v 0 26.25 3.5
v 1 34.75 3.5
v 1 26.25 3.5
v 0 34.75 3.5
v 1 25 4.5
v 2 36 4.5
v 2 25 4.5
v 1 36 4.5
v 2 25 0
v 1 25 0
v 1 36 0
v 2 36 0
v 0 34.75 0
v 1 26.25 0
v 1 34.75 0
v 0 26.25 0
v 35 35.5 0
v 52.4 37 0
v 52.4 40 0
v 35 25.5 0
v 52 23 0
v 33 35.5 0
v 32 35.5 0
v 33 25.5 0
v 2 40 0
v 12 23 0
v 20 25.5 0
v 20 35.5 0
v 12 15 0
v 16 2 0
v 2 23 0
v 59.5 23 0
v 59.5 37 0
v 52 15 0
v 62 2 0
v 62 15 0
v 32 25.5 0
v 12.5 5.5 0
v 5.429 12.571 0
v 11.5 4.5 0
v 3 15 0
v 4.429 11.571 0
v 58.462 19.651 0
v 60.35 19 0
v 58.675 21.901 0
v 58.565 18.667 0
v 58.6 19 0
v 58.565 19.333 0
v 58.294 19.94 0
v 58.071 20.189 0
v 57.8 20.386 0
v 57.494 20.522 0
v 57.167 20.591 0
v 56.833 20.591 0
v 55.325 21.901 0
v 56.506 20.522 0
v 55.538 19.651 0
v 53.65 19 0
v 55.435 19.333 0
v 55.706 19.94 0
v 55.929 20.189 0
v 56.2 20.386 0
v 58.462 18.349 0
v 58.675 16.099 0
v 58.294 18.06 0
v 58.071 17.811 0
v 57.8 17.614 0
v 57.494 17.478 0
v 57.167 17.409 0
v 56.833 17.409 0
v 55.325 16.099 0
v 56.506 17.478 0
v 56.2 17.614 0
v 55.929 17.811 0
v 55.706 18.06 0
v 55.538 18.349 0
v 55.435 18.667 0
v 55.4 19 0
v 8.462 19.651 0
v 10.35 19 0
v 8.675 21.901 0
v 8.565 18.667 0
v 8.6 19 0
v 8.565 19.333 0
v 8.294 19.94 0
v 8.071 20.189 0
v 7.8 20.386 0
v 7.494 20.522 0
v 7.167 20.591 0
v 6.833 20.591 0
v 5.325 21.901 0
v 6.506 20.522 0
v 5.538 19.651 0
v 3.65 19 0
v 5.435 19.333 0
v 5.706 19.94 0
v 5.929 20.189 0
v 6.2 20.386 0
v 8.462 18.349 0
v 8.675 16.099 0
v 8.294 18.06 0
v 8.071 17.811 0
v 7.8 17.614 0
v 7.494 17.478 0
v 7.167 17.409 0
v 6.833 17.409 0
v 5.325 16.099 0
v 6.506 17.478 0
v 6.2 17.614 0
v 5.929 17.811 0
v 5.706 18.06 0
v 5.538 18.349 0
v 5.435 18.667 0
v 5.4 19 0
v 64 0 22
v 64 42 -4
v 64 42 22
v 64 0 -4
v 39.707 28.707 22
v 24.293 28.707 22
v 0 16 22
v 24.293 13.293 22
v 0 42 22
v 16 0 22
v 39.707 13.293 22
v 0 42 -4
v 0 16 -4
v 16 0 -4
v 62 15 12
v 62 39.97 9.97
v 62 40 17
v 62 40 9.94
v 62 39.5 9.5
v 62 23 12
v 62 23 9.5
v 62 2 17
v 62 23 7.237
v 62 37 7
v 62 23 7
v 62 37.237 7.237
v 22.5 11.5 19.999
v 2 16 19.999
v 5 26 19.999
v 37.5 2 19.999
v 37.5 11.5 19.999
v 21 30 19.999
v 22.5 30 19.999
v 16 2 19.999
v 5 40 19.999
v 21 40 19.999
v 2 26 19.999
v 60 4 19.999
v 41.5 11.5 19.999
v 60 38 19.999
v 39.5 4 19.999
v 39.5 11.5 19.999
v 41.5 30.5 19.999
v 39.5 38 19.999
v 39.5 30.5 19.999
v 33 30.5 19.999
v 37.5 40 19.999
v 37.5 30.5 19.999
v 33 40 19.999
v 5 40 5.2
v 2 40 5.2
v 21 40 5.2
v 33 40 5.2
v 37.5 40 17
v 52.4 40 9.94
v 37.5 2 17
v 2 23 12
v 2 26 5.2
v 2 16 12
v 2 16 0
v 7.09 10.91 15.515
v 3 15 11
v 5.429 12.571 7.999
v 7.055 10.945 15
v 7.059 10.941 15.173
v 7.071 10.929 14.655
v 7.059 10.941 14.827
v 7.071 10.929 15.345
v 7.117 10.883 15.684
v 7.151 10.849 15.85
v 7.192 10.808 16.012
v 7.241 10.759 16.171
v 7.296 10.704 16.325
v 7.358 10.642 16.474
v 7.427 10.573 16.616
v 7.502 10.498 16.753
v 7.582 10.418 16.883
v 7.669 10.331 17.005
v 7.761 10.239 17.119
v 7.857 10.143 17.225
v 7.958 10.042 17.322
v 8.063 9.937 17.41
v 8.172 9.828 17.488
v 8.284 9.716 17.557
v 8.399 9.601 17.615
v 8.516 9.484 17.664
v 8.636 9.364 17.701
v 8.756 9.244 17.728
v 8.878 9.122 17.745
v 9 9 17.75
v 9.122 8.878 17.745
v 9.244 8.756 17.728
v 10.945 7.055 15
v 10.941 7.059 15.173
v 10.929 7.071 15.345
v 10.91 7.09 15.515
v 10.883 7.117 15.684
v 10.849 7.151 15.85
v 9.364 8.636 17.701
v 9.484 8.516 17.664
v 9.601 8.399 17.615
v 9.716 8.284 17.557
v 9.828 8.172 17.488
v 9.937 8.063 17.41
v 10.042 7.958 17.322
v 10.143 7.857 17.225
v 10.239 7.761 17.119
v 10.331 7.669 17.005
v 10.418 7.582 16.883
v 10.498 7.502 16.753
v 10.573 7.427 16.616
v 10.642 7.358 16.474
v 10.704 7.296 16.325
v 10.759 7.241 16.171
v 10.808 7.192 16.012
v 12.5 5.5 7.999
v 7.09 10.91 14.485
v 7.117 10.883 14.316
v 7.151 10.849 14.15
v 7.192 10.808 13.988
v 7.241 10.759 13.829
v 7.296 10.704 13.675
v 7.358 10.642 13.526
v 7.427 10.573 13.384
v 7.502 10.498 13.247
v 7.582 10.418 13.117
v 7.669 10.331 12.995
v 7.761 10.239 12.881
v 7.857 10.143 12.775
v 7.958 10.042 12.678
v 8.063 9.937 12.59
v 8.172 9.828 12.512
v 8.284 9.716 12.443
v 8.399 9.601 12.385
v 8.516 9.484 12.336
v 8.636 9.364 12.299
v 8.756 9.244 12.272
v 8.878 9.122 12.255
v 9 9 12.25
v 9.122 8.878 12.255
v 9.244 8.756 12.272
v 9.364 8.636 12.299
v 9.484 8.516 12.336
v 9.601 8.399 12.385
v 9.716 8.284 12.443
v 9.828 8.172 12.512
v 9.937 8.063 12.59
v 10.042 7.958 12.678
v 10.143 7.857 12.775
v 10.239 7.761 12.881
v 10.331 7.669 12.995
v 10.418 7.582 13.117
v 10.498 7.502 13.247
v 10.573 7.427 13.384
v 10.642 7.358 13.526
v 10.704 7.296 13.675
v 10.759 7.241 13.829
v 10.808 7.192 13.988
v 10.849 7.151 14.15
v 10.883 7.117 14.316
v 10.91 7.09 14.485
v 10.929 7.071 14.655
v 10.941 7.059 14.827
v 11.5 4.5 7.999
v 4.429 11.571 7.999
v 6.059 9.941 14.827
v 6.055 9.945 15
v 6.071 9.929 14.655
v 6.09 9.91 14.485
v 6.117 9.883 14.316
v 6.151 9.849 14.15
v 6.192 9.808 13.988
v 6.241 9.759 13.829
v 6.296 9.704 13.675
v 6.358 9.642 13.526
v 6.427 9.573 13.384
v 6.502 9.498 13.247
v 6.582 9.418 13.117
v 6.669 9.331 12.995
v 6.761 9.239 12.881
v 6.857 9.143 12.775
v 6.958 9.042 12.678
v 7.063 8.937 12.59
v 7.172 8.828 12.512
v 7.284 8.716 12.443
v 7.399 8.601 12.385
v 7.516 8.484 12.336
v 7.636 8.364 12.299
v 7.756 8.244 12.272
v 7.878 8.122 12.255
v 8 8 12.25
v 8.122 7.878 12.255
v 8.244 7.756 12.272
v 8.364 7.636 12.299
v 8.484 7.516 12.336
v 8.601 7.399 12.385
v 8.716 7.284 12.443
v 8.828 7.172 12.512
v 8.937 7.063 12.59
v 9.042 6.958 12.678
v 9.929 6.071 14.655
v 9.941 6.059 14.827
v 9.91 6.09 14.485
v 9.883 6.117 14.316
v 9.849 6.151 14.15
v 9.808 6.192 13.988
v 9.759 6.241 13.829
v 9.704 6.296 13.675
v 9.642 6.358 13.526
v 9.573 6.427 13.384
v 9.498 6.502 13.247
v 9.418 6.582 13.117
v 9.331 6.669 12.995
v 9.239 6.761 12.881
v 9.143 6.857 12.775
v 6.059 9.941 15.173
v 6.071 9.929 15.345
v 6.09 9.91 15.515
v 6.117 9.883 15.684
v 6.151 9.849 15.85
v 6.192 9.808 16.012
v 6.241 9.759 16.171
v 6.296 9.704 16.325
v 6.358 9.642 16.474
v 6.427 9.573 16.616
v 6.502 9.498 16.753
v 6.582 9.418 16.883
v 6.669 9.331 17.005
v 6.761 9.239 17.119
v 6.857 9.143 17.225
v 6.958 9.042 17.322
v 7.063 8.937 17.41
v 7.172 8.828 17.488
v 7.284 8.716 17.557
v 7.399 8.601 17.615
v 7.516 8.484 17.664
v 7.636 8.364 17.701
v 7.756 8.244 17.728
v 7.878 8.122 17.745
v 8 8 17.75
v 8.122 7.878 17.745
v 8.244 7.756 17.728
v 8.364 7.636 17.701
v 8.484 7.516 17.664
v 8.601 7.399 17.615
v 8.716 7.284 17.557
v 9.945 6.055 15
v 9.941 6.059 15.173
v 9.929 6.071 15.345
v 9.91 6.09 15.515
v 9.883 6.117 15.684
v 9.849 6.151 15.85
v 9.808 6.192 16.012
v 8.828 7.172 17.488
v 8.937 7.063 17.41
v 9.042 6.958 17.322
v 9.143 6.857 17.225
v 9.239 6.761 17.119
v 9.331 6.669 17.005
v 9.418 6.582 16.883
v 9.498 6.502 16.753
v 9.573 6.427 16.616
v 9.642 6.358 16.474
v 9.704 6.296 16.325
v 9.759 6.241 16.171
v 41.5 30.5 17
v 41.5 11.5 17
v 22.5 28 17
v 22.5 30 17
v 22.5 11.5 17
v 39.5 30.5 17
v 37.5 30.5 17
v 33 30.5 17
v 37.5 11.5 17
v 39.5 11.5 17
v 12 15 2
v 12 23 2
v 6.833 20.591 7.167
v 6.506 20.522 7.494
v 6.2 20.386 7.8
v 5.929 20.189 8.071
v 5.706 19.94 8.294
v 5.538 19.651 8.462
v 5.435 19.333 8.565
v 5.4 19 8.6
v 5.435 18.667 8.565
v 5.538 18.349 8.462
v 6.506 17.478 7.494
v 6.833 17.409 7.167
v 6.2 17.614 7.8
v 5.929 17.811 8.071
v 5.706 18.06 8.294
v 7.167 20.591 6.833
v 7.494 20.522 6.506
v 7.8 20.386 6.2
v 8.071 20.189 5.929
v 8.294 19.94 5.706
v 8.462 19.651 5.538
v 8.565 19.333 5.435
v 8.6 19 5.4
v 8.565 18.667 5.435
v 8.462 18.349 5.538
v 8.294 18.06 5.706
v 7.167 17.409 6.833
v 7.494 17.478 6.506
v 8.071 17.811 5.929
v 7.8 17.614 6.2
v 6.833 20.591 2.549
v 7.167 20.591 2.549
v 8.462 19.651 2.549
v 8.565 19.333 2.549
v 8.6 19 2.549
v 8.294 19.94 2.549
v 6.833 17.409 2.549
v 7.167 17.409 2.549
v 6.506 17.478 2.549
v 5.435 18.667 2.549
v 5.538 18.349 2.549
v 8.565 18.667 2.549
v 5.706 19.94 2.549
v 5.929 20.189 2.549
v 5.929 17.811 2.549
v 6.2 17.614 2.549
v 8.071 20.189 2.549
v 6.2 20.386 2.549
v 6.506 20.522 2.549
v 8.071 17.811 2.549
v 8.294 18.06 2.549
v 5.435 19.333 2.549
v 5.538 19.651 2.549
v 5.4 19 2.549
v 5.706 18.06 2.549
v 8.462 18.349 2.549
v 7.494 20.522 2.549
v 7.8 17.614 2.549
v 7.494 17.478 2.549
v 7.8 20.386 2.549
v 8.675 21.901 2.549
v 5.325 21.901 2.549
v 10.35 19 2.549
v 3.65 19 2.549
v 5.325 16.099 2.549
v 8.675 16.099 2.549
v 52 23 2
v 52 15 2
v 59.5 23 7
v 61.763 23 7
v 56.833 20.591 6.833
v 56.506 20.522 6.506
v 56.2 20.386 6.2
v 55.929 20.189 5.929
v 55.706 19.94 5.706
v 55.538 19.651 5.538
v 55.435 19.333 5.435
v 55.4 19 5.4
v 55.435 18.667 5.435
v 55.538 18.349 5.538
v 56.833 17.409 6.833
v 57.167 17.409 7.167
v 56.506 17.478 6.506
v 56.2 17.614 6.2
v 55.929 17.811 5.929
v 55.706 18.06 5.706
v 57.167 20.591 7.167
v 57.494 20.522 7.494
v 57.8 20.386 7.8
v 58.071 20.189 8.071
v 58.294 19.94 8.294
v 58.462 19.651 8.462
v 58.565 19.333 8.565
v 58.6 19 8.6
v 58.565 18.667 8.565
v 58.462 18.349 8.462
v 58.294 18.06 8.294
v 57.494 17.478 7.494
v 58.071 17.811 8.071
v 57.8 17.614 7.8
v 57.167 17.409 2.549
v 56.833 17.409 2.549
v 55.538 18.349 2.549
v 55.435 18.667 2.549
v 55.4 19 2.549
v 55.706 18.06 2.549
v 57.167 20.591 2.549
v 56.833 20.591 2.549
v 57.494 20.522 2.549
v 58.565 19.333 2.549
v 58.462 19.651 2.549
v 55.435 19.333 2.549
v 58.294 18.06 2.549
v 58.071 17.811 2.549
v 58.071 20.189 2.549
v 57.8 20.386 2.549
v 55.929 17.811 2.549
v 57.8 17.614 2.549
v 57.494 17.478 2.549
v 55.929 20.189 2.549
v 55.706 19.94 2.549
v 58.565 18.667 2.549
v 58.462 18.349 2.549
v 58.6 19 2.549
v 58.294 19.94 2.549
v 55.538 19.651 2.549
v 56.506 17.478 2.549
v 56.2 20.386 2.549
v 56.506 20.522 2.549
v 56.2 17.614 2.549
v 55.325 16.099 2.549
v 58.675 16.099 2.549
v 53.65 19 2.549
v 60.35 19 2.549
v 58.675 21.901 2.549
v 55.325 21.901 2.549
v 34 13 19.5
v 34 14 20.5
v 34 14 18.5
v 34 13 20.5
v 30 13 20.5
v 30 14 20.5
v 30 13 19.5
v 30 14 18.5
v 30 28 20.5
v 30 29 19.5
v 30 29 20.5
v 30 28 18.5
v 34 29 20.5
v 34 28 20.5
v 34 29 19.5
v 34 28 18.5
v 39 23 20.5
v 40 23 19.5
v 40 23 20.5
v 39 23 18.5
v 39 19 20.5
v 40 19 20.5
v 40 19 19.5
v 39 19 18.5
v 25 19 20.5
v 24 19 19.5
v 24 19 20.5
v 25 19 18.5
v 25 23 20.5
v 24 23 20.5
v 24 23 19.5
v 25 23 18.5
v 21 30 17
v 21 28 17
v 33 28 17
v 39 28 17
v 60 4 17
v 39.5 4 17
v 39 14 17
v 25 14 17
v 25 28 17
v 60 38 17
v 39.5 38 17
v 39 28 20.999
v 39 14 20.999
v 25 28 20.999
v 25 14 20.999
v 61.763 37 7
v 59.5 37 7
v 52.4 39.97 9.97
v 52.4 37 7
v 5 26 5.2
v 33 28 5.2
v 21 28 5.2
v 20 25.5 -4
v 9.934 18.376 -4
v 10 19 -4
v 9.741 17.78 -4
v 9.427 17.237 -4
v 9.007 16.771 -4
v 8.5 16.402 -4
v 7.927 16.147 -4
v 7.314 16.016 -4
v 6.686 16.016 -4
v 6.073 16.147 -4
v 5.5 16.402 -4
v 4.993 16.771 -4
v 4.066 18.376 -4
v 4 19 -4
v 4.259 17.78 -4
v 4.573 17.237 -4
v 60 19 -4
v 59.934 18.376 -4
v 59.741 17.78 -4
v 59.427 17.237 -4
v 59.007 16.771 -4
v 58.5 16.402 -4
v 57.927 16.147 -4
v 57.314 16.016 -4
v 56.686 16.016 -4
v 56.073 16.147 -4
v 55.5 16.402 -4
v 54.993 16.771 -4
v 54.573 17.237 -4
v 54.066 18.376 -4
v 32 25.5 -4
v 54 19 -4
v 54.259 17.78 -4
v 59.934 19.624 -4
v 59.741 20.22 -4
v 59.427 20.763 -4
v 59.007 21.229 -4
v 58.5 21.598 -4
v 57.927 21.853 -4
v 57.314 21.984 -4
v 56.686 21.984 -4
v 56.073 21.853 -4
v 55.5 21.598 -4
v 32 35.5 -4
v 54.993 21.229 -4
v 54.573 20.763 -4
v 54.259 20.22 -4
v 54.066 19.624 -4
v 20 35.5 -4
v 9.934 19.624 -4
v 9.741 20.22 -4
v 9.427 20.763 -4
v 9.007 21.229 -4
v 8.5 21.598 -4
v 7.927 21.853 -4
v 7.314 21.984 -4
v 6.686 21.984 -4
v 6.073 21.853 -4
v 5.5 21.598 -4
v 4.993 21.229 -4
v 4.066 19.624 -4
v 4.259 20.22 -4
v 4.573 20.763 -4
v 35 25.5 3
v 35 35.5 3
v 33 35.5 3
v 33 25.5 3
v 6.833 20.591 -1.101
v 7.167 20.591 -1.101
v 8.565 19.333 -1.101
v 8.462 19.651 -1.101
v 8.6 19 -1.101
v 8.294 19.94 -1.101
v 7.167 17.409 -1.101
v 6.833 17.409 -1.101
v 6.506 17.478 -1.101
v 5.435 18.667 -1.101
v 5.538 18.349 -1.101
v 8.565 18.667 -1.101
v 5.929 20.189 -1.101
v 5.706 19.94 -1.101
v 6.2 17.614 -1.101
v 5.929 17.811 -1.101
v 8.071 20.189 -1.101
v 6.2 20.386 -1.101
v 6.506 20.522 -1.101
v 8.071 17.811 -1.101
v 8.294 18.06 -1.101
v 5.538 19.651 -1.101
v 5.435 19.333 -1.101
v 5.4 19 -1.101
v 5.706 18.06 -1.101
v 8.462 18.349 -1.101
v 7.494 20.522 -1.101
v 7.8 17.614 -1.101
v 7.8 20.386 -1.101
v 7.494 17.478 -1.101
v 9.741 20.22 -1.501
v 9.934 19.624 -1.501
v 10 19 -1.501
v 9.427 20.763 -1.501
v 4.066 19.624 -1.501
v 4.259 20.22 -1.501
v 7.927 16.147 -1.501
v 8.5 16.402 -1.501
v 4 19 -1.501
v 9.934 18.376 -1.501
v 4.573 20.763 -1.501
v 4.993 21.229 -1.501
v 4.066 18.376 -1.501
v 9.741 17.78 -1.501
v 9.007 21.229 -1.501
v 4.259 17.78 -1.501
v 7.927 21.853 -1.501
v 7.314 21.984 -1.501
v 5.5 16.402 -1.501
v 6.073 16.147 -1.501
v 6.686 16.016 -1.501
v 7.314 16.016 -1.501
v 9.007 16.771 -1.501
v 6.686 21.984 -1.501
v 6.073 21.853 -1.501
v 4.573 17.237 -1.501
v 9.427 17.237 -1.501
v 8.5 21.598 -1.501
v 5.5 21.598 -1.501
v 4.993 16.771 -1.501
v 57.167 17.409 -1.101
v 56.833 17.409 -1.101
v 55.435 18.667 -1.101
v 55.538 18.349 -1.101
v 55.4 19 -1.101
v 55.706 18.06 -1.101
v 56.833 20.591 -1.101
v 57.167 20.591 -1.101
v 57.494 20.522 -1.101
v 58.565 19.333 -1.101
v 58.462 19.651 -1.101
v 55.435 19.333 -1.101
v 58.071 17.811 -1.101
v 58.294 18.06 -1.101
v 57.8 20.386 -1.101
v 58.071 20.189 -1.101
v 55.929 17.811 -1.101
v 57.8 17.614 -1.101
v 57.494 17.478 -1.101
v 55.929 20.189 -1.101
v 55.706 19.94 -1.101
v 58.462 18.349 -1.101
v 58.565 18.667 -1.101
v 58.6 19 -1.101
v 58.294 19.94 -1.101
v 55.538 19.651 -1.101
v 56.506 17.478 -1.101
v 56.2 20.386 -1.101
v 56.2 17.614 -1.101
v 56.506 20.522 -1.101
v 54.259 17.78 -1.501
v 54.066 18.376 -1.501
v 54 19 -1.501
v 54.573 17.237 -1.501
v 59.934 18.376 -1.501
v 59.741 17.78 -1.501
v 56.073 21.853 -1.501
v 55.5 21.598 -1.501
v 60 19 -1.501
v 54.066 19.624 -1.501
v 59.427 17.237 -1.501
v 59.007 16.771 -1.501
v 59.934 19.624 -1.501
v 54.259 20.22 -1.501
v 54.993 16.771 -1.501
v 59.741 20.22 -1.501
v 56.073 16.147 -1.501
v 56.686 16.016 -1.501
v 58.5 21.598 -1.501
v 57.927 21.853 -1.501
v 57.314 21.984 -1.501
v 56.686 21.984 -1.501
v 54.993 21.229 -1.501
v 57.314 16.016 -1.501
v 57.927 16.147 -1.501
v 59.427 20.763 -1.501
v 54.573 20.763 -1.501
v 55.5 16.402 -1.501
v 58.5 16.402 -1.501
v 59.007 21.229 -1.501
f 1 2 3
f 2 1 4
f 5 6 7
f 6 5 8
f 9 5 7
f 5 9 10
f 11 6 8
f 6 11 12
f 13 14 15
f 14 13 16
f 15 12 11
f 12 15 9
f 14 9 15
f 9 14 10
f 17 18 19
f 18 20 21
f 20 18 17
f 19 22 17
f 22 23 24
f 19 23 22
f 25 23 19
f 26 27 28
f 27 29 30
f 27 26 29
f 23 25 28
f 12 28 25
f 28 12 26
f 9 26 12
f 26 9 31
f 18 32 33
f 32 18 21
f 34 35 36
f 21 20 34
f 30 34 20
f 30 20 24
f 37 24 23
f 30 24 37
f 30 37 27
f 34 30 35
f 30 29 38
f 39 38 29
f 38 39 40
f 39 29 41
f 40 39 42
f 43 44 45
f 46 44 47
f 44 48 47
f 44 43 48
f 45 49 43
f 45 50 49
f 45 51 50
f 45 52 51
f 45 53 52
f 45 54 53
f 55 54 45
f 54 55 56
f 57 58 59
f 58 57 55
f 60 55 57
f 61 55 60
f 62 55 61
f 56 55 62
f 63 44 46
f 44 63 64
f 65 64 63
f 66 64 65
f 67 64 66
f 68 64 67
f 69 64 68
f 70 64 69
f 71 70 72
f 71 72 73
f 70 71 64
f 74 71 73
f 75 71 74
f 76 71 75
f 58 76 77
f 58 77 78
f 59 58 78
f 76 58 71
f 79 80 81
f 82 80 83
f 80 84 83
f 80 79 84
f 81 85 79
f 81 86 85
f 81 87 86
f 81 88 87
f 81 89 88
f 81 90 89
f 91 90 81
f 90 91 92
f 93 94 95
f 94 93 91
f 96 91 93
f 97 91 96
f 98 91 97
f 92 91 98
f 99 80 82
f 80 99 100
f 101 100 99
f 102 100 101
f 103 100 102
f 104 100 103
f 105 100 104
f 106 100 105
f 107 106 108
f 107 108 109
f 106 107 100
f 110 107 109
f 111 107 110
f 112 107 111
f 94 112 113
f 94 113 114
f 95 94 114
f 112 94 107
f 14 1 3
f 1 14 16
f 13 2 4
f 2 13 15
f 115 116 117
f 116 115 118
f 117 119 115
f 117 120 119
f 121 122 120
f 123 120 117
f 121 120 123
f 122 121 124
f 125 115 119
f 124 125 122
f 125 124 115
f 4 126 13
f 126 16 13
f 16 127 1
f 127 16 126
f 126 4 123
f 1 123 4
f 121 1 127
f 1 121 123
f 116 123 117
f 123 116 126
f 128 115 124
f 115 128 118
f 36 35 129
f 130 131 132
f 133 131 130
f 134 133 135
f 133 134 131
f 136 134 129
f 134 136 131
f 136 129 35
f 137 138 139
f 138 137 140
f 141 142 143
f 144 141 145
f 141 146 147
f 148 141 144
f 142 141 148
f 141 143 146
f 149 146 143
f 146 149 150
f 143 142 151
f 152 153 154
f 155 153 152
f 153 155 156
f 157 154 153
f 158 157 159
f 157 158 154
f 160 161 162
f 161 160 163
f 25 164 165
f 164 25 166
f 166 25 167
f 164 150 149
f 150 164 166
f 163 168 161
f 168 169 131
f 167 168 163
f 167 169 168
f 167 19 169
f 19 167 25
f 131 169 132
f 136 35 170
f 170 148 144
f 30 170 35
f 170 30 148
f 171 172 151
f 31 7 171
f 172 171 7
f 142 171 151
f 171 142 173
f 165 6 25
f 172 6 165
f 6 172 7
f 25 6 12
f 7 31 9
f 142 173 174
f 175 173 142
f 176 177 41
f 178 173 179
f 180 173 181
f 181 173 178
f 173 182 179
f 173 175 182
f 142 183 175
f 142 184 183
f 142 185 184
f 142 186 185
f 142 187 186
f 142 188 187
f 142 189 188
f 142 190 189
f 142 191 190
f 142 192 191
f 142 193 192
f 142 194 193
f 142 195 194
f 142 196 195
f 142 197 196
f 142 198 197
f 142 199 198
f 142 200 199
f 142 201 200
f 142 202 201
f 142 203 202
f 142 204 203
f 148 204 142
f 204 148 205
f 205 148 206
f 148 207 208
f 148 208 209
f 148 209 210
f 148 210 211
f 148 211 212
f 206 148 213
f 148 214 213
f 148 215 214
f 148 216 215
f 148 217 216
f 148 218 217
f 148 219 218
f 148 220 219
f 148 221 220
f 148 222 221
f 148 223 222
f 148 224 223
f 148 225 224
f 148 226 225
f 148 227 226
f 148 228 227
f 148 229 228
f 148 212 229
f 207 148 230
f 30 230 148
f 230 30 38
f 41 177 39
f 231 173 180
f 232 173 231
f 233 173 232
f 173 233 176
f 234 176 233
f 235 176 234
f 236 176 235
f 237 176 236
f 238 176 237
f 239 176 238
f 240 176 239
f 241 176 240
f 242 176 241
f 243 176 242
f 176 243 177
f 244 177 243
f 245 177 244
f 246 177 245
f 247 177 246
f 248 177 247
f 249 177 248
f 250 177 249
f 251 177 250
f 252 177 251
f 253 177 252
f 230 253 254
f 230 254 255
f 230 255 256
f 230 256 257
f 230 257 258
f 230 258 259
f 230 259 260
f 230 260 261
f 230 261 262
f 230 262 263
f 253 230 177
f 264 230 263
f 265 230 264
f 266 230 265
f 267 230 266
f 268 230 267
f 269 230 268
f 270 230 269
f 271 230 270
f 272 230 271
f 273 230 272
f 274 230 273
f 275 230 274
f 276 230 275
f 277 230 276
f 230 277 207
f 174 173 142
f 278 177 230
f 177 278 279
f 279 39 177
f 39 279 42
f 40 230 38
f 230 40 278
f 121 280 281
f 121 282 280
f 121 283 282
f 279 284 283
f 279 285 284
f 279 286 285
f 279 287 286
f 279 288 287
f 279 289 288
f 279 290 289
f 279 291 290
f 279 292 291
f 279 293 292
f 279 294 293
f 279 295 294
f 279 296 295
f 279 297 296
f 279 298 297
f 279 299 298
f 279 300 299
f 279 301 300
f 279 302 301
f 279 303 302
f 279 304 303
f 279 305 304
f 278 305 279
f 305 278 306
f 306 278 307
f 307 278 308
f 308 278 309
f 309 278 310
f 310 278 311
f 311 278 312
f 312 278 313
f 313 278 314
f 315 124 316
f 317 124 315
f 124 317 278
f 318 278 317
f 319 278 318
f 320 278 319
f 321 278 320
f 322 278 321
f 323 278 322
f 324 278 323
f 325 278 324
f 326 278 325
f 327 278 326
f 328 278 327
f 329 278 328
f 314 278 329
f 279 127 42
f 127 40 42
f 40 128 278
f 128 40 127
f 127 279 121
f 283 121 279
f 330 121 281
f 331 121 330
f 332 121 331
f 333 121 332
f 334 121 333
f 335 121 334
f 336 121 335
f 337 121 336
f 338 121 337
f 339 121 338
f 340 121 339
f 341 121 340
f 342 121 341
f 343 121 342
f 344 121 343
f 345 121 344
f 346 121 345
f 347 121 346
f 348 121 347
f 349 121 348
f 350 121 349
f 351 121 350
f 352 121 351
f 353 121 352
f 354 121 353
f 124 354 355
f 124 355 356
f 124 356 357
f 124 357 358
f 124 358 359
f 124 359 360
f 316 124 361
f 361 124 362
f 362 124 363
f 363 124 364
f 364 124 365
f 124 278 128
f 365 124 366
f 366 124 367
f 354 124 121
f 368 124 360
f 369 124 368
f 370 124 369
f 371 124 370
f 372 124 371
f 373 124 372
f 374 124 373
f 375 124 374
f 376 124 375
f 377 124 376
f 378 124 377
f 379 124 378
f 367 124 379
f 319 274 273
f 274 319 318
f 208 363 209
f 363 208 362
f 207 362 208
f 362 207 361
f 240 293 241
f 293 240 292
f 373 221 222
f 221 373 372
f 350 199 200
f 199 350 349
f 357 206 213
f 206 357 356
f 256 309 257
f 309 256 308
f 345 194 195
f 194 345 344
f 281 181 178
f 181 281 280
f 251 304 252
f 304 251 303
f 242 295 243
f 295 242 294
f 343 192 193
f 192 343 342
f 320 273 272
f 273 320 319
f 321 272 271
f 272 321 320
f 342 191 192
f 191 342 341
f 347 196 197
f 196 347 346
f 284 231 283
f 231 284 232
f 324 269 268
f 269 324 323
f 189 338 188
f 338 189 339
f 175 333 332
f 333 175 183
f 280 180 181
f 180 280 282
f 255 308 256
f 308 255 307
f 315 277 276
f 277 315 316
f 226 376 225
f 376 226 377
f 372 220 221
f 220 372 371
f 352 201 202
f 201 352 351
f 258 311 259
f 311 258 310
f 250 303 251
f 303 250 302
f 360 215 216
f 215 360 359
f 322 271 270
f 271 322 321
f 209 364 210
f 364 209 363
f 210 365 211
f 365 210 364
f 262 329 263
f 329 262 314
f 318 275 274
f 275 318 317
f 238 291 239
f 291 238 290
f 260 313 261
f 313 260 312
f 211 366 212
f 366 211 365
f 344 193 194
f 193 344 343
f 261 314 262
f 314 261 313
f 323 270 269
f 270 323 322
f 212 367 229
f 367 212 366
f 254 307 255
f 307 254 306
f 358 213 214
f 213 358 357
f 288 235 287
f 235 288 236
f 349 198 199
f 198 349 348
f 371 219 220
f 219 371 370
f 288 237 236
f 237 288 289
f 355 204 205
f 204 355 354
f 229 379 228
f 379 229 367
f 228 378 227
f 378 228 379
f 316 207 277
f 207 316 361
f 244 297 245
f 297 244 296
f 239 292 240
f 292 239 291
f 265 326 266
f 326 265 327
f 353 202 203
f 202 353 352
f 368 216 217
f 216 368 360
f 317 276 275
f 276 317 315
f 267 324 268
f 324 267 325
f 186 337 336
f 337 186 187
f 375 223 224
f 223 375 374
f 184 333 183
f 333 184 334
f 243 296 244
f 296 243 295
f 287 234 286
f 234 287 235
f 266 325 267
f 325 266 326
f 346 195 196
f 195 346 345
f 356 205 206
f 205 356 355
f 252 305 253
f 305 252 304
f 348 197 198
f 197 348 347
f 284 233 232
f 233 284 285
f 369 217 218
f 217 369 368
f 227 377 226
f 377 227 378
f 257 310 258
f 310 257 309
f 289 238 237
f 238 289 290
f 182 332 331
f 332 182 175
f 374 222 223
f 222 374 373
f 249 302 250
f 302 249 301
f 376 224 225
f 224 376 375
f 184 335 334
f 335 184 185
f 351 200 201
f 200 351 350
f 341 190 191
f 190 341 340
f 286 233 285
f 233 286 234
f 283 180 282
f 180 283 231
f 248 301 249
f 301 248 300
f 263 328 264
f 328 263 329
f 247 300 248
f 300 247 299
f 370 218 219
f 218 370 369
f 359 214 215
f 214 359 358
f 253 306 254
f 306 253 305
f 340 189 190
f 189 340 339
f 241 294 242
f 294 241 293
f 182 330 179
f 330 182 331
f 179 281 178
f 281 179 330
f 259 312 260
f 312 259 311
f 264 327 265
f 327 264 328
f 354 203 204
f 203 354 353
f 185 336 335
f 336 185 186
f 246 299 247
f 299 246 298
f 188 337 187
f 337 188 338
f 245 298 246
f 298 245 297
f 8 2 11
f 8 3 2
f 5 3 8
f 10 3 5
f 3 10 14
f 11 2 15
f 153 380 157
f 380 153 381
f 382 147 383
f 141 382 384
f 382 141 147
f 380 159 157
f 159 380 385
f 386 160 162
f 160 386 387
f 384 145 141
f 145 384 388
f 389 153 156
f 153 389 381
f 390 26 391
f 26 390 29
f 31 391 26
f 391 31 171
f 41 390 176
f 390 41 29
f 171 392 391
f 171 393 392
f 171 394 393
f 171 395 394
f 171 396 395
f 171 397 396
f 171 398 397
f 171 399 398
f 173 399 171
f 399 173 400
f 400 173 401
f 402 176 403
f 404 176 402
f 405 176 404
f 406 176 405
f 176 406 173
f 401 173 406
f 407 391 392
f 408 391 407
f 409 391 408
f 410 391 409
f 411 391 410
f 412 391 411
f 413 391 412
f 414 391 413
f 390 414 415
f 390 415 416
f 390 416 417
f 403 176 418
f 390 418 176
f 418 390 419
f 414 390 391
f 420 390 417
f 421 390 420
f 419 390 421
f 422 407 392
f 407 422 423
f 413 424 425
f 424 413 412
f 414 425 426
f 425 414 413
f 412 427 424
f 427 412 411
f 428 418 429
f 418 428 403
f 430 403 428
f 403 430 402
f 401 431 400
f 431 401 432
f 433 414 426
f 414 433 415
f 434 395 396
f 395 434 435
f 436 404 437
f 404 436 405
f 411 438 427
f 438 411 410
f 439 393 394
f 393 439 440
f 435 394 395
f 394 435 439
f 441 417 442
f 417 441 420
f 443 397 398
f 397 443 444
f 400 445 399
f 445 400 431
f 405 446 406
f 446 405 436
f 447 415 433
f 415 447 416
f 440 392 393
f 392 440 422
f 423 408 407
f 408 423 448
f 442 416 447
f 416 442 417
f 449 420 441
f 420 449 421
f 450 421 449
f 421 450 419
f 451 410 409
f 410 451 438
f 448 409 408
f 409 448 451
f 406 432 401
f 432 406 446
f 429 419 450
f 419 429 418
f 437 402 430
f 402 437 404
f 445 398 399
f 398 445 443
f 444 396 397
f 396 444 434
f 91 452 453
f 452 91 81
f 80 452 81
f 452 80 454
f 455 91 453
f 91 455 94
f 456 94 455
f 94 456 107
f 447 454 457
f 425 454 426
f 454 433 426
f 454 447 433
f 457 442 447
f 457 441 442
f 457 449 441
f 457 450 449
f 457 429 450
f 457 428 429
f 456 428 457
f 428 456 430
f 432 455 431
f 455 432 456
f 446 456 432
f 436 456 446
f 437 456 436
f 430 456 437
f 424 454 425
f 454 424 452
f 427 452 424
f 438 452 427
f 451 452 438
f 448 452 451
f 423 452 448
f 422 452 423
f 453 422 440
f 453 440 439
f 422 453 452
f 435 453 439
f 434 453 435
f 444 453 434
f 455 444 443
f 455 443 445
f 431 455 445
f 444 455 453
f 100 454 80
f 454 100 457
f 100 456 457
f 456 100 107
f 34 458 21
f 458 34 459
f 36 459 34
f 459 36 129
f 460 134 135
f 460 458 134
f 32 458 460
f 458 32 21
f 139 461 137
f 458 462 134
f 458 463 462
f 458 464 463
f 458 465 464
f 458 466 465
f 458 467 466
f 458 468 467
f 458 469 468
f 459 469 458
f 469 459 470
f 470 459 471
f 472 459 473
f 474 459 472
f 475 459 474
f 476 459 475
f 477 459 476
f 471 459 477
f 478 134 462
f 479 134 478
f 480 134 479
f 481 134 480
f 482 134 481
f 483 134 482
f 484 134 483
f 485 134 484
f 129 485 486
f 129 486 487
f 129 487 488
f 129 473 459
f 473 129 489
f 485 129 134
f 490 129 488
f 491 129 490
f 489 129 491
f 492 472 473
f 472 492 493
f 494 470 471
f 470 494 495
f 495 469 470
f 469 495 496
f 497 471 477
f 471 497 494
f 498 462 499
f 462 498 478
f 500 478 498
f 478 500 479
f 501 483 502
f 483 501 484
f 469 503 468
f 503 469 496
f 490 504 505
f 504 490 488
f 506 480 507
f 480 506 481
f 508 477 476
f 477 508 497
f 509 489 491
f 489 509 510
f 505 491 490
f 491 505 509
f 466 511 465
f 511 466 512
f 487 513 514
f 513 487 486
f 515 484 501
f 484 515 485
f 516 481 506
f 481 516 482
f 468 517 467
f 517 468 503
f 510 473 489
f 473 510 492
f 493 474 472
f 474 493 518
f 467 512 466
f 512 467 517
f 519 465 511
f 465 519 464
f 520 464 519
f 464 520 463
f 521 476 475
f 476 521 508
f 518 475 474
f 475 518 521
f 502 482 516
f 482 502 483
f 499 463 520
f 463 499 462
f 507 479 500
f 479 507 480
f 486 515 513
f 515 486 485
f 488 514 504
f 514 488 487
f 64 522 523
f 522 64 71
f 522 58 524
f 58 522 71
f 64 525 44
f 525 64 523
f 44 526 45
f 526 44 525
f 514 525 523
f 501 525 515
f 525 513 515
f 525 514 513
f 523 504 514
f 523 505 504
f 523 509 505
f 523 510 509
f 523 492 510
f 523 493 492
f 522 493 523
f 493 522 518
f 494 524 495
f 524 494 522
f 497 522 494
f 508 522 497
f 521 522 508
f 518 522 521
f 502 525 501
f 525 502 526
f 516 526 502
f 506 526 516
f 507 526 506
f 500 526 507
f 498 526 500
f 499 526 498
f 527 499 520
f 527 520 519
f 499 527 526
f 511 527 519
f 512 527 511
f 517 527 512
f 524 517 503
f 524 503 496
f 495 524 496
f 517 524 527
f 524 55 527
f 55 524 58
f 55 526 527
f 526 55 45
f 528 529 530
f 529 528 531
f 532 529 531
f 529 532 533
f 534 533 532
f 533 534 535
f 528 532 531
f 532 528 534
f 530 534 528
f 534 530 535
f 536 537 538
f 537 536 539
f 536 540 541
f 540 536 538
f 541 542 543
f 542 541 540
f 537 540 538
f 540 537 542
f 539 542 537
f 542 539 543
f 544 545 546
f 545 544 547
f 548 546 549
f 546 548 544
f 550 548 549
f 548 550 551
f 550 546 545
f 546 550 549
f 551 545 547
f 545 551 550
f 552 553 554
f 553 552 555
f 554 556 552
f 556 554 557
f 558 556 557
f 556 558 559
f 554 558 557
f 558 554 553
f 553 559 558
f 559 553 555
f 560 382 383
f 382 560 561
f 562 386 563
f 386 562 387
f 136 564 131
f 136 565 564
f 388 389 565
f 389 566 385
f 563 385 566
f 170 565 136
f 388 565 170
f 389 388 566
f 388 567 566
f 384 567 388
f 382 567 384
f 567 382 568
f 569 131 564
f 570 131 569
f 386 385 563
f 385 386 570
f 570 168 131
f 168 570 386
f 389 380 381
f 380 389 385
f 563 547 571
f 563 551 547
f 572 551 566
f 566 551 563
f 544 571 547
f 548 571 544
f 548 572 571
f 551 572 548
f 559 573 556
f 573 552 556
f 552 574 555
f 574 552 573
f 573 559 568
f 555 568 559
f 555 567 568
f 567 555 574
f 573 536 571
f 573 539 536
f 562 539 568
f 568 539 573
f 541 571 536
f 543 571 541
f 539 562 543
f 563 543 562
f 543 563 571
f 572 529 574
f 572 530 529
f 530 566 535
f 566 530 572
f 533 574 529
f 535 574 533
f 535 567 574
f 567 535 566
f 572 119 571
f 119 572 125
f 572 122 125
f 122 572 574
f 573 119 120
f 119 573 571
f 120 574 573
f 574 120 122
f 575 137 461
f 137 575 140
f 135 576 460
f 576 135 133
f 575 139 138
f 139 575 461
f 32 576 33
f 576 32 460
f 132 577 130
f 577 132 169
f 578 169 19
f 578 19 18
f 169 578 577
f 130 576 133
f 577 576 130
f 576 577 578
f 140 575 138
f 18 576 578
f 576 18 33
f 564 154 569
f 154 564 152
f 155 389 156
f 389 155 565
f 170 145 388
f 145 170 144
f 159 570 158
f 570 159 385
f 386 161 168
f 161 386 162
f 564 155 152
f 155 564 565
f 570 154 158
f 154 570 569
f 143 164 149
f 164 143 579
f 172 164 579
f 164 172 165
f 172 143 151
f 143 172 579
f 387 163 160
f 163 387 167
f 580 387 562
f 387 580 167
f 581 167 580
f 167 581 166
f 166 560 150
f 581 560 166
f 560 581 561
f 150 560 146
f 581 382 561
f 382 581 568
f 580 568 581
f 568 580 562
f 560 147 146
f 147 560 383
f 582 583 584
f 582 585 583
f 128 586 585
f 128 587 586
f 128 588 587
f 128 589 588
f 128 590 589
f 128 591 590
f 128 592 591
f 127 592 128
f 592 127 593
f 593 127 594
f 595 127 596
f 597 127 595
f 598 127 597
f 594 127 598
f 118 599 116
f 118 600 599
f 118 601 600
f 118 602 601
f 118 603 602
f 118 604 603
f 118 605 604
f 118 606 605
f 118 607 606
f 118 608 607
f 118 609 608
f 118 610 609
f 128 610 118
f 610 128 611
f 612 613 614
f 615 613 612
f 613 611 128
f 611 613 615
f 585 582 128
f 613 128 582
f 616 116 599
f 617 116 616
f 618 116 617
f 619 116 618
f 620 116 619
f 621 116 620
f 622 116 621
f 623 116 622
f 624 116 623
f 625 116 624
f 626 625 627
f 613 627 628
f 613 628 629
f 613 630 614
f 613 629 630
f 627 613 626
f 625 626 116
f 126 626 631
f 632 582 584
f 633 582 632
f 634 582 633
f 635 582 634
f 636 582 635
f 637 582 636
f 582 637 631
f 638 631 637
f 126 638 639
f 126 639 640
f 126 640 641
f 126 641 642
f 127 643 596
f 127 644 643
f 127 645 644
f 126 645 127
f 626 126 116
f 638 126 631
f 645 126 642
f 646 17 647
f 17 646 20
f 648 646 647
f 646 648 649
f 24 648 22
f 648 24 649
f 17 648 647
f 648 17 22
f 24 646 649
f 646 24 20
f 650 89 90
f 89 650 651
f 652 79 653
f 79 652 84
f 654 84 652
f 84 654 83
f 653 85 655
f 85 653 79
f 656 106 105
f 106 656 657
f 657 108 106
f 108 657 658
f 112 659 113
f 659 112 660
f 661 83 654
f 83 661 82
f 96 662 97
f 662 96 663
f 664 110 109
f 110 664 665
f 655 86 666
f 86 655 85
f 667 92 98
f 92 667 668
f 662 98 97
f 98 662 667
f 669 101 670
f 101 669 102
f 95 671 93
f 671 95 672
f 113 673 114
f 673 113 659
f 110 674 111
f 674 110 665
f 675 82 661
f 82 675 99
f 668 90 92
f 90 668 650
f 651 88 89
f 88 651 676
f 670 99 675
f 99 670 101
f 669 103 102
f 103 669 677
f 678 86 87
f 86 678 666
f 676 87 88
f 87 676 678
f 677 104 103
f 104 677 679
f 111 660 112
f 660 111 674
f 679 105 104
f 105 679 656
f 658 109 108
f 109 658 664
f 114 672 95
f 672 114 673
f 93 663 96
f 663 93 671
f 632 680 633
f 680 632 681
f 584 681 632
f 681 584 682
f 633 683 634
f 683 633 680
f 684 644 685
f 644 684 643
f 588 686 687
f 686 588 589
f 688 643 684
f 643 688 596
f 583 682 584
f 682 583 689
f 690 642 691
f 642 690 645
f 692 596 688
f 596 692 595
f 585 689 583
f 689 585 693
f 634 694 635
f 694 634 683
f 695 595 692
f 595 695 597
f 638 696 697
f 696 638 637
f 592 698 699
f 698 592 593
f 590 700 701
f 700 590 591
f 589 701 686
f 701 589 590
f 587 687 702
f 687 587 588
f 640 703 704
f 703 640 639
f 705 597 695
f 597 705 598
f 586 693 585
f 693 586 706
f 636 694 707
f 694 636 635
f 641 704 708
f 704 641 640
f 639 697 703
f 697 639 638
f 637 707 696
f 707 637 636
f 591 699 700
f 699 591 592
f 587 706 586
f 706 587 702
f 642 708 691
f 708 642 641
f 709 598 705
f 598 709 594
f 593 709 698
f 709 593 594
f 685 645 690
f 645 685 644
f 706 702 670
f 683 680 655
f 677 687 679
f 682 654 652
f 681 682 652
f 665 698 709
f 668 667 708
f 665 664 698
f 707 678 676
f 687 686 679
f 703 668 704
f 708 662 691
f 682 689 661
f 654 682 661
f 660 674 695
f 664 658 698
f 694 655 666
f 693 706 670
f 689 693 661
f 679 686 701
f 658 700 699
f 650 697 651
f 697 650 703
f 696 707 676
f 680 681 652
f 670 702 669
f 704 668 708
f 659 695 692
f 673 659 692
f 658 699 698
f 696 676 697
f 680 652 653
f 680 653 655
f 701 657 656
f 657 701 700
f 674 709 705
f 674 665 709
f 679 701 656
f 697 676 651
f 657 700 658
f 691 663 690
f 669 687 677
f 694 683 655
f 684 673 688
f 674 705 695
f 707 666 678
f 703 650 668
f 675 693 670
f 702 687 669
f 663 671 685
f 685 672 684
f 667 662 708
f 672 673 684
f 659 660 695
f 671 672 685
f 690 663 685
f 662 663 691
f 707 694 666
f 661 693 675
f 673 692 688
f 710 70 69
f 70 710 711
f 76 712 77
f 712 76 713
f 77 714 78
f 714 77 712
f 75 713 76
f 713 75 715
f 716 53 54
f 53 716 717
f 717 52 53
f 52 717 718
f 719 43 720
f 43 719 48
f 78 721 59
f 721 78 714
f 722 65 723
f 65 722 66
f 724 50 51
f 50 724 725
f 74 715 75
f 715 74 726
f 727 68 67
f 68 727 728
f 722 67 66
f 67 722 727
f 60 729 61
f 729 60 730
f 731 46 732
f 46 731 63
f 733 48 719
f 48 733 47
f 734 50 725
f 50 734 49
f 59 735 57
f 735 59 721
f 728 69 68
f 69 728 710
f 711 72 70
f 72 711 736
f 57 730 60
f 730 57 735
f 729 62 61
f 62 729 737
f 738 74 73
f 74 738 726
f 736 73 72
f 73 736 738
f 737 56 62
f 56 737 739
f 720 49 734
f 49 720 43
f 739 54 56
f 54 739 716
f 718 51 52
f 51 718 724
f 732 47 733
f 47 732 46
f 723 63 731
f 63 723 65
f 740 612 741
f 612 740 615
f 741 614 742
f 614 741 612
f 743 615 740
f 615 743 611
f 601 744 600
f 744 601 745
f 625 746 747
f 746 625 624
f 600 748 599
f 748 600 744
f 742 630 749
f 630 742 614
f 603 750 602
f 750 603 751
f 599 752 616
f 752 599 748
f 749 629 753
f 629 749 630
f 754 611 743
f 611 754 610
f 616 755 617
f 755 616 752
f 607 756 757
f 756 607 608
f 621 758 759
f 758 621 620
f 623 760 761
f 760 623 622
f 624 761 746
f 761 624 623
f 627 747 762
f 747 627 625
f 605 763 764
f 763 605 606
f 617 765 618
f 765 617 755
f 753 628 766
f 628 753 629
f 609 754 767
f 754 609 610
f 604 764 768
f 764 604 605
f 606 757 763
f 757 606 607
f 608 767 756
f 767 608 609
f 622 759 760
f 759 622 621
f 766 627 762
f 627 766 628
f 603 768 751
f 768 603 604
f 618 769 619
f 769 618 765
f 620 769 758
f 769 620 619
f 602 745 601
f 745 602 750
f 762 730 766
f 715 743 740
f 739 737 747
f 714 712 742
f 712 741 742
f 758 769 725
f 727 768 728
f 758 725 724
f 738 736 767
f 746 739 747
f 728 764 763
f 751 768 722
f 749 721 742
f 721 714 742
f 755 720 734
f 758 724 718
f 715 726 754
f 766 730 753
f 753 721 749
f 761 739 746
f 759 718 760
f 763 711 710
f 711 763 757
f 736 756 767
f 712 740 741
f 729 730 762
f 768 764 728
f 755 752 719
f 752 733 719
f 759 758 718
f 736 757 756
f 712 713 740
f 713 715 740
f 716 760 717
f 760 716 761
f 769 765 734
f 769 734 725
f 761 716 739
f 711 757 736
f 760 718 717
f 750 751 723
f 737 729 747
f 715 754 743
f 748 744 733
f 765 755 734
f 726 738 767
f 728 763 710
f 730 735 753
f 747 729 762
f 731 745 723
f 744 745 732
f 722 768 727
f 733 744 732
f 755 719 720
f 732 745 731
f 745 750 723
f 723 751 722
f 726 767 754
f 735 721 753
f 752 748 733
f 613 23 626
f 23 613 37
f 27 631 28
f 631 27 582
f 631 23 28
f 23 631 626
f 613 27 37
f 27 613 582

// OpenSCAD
//
// ktBOX4
//
//


gap1 = 0.001;
gap2 = 0.002;

panel_thick = 2;
panel_thick2 = 2+2;

X = 60;
Y = 38;
Z = 20;


key_pitch_x = 19;
key_pitch_y = 19;
hole_x = 14;
hole_y = 14;
keybase_thick = 5;

A = 1;
B = 1;
C = 0; //not use

if(A)
{
difference()
{
    union()
    {
        translate([0, 0, 0]) cube([X+panel_thick*2, Y+panel_thick*2, Z+panel_thick]);
    }
    translate([panel_thick+14, panel_thick, -gap1]) cube([X-14, Y, Z]);
    translate([panel_thick, panel_thick+14, -gap1]) cube([14+gap1, Y-14, Z]);
    //kado
    translate([14+panel_thick, panel_thick, -gap1]) rotate([0, 0, 45]) cube([14, 14*sqrt(2), Z]);
    translate([8.5, 1.5, -gap1]) rotate([0, 0, 45]) cube([10, 10, 8]);
    translate([16, 0, -gap1]) rotate([0, 0, 90+45]) cube([50, 50, 50]);
    //SW hole
    translate([0, 0, Z-5]) rotate([90, 0, -45]) cylinder(30, d=4.5+1, center=true, $fn=100);
    //board
    #translate([-gap1, Y-2, 4.5]) rotate([180, 0, 0]) board();
    translate([1.5-0.5, Y-2, 4.5]) rotate([180, 0, 0]) cube([7.5, 10+1, 7.5]);
    //Key hole
    translate([(X+panel_thick*2)/2-key_pitch_x/2, (Y+panel_thick*2)/2-key_pitch_y/2, Z+panel_thick-keybase_thick+gap1]) cube([key_pitch_x, key_pitch_y, keybase_thick]);
}
//screw
translate([panel_thick, Y/2-8/2, 0]) Fscrew();
translate([X+panel_thick, Y/2+8/2, 0]) rotate([0, 0, 180]) Fscrew();
//Spacer1
translate([X-0.5, Y-16, 7]) rotate([0, 45, 0]) cube([1.6, 18, 4]);
translate([X-0.5, Y-16, 0]) cube([3, 18, 7]);
//Spacer2
translate([X+2.4, Y-1, 7]) rotate([0, 45, 90]) cube([2.5, 10, 4.2]);
translate([X+2.4, Y-1, 0]) rotate([0, 0, 90]) cube([4, 10, 7]);
//Key
translate([(X+panel_thick*2)/2-key_pitch_x/2, (Y+panel_thick*2)/2-key_pitch_y/2, Z+panel_thick]) key(0,0);
//base
translate([X+panel_thick-2, (Y+panel_thick*2)/2-Y/2, Z+panel_thick-keybase_thick]) cube([2, Y, keybase_thick]);
translate([(X-4+panel_thick*2)/2+key_pitch_x/2-2, panel_thick, Z+panel_thick-keybase_thick]) cube([2, 10, keybase_thick]);
translate([(X-4+panel_thick*2)/2+key_pitch_x/2-2, (Y+panel_thick*2)-12, Z+panel_thick-keybase_thick]) cube([2, 12, keybase_thick]);
translate([X-22, (Y+panel_thick*2)/2-Y/2, Z+panel_thick-keybase_thick]) cube([23, 2, keybase_thick]);
translate([X-22, Y, Z+panel_thick-keybase_thick]) cube([23, 2, keybase_thick]);
//tower
translate([panel_thick, (Y+panel_thick*2)-16, 5.2]) cube([3, 16, Z-5.2]);
translate([(X-3+panel_thick*2)/2-key_pitch_x/2, (Y+panel_thick*2)-14, 5.2]) cube([12, 14, Z-5.2-3]);
translate([(X-3+panel_thick*2)/2-key_pitch_x/2, (Y+panel_thick*2)-12, Z-3]) cube([12, 12, 3]);
}
if(B)
{
difference()
{
    union()
    {
        translate([0, 0, -panel_thick2]) cube([X+panel_thick*2, Y+panel_thick*2, panel_thick2]);
        translate([20+13, Y-2-10.5, 0]) cube([2, 10, 3]);
    }
    //window
    translate([20, Y-2-10.5, -panel_thick2-gap1]) cube([12, 10, panel_thick2+gap2]);
    //screw
    translate([panel_thick, Y/2-8/2, -panel_thick2]) Mscrew();
    translate([X+panel_thick, Y/2+8/2, -panel_thick2]) rotate([0, 0, 180]) Mscrew();
    //kado
    translate([16, 0, -10]) rotate([0, 0, 90+45]) cube([50, 50, 50]);
}
}
if(C)
{
difference()
{
    union()
    {
        translate([0, 0, 0]) cube([X+panel_thick*2, Y+panel_thick*2, Z+panel_thick]);
    }
    //kado
    translate([130, 25, -gap1]) rotate([0, 0, 90+45]) cube([150, 100, 50]);
    //SW hole
    difference()
    {
        translate([0, 0, Z-5]) rotate([90, 0, -45]) cylinder(20, d=5+0.5, center=true, $fn=100);
        translate([10, -5, -gap1]) rotate([0, 0, 90+45]) cube([20, 20, 50]);
    }
    //SW hole2
    difference()
    {
        translate([0, 0, Z-5]) rotate([90, 0, -45]) cylinder(20, d=8+1.5, center=true, $fn=100);
        translate([14, -5, -gap1]) rotate([0, 0, 90+45]) cube([20, 20, 50]);
    }
    //hole
    translate([0, 0, 2.5-gap1]) rotate([0, 0, 90+45]) cube([6, 30, 5], center=true);
}
difference()
{
    translate([12.3, 6, -gap1]) rotate([0, 0, 90+45]) cube([10-1, 6, 8-1]);
    translate([0, 0, 2.5-gap1]) rotate([0, 0, 90+45]) cube([6, 30, 5], center=true);
}
}





module key( x, y, w=1 ){
    translate( [key_pitch_x*x + key_pitch_x/2 + key_pitch_x*(w - 1)/2, key_pitch_y*y + key_pitch_y/2, -(keybase_thick/2)] ){
        difference(){
            cube( [key_pitch_x*w, key_pitch_y, keybase_thick], center=true );
            cube( [hole_x, hole_y, keybase_thick + gap2], center=true );
            translate( [0, -hole_y/2, keybase_thick/2 - 1.5] )
            claw();
            translate( [0, hole_y/2, keybase_thick/2 - 1.5] )
            rotate( [0, 0, 180] )
            claw();
            translate( [hole_x/2, 0, keybase_thick/2 - 1.5] )
            rotate( [0, 0, 90] )
            claw();
            translate( [-hole_x/2, 0, keybase_thick/2 - 1.5] )
            rotate( [0, 0, -90] )
            claw();
            translate( [0, 0, keybase_thick + 2] )
            rotate( [180, 0, 45] )
            cylinder( hole_y*1.1, hole_y*1.1, 0, $fn=4 );
        }
    }
}
module claw(){
    translate( [-2, -1, -1] ){
        difference(){
            union(){
                cube( [4, 2, 1] );
                rotate( [-45, 0, 0] )
                cube( [4, 2, 1] );
            }
            translate( [-gap1, 1+gap1, -2-gap1] )
            cube( [4+gap2, 2, 3+gap2] );
        }
    }
}

module board()
{
    difference()
    {
        union()
        {
            translate([1.5, 0, 0]) cube([57.5, 10+1, 1]);
            translate([0, (10+1)/2-(7.5+1)/2, 1]) cube([5.5, 7.5+1, 3.5]);
            translate([5.5, 0, 1]) cube([14.3, 10+1, 1]);
            translate([5.5, 0, -0.5]) cube([14.3, 10+1, 0.5]);
            translate([20, 0, 1]) cube([13, 10+1, 2.5]);
            translate([20, 0, -0.7]) cube([13, 10+1, 0.7]);
            translate([36, 0, 0]) cube([5, 10+1, 2]);
            translate([42.5, (10+1)/2-(13/2), 0]) cube([17.5, 13+1, 2]);
            translate([42.5, (10+1)/2-(13/2), -11]) cube([17.5, 13+1, 11]);
            
            translate([38, -3, -12]) cube([23.5, 36.2, 1]);
        }
    }
}

module Fscrew()
{
    difference()
    {
        union()
        {
            cube( [10, 8, 12] );
        }
        translate([0, -gap1, 12]) rotate([0, 45, 0]) cube( [20, 8+gap2, 10] );
        translate([10/2, 8/2, 0]) cylinder(10, 1.6, 1.6, $fn=30);
        translate([10/2, 8/2, -gap1]) cylinder(2.4+0.15, 6.5/2+0.1, 6.5/2+0.1, $fn=6);
    }
}

module Mscrew()
{
    translate([10/2, 8/2, 0]) cylinder(10, 1.6, 1.6, $fn=30);
    translate([10/2, 8/2, -gap1]) cylinder(2.2+0.3, 6/2, 6/2, $fn=30);
    translate([10/2, 8/2, 2.2+0.3-gap1]) cylinder(0.4, d1=6, d2=1.6*2, $fn=30);
}
